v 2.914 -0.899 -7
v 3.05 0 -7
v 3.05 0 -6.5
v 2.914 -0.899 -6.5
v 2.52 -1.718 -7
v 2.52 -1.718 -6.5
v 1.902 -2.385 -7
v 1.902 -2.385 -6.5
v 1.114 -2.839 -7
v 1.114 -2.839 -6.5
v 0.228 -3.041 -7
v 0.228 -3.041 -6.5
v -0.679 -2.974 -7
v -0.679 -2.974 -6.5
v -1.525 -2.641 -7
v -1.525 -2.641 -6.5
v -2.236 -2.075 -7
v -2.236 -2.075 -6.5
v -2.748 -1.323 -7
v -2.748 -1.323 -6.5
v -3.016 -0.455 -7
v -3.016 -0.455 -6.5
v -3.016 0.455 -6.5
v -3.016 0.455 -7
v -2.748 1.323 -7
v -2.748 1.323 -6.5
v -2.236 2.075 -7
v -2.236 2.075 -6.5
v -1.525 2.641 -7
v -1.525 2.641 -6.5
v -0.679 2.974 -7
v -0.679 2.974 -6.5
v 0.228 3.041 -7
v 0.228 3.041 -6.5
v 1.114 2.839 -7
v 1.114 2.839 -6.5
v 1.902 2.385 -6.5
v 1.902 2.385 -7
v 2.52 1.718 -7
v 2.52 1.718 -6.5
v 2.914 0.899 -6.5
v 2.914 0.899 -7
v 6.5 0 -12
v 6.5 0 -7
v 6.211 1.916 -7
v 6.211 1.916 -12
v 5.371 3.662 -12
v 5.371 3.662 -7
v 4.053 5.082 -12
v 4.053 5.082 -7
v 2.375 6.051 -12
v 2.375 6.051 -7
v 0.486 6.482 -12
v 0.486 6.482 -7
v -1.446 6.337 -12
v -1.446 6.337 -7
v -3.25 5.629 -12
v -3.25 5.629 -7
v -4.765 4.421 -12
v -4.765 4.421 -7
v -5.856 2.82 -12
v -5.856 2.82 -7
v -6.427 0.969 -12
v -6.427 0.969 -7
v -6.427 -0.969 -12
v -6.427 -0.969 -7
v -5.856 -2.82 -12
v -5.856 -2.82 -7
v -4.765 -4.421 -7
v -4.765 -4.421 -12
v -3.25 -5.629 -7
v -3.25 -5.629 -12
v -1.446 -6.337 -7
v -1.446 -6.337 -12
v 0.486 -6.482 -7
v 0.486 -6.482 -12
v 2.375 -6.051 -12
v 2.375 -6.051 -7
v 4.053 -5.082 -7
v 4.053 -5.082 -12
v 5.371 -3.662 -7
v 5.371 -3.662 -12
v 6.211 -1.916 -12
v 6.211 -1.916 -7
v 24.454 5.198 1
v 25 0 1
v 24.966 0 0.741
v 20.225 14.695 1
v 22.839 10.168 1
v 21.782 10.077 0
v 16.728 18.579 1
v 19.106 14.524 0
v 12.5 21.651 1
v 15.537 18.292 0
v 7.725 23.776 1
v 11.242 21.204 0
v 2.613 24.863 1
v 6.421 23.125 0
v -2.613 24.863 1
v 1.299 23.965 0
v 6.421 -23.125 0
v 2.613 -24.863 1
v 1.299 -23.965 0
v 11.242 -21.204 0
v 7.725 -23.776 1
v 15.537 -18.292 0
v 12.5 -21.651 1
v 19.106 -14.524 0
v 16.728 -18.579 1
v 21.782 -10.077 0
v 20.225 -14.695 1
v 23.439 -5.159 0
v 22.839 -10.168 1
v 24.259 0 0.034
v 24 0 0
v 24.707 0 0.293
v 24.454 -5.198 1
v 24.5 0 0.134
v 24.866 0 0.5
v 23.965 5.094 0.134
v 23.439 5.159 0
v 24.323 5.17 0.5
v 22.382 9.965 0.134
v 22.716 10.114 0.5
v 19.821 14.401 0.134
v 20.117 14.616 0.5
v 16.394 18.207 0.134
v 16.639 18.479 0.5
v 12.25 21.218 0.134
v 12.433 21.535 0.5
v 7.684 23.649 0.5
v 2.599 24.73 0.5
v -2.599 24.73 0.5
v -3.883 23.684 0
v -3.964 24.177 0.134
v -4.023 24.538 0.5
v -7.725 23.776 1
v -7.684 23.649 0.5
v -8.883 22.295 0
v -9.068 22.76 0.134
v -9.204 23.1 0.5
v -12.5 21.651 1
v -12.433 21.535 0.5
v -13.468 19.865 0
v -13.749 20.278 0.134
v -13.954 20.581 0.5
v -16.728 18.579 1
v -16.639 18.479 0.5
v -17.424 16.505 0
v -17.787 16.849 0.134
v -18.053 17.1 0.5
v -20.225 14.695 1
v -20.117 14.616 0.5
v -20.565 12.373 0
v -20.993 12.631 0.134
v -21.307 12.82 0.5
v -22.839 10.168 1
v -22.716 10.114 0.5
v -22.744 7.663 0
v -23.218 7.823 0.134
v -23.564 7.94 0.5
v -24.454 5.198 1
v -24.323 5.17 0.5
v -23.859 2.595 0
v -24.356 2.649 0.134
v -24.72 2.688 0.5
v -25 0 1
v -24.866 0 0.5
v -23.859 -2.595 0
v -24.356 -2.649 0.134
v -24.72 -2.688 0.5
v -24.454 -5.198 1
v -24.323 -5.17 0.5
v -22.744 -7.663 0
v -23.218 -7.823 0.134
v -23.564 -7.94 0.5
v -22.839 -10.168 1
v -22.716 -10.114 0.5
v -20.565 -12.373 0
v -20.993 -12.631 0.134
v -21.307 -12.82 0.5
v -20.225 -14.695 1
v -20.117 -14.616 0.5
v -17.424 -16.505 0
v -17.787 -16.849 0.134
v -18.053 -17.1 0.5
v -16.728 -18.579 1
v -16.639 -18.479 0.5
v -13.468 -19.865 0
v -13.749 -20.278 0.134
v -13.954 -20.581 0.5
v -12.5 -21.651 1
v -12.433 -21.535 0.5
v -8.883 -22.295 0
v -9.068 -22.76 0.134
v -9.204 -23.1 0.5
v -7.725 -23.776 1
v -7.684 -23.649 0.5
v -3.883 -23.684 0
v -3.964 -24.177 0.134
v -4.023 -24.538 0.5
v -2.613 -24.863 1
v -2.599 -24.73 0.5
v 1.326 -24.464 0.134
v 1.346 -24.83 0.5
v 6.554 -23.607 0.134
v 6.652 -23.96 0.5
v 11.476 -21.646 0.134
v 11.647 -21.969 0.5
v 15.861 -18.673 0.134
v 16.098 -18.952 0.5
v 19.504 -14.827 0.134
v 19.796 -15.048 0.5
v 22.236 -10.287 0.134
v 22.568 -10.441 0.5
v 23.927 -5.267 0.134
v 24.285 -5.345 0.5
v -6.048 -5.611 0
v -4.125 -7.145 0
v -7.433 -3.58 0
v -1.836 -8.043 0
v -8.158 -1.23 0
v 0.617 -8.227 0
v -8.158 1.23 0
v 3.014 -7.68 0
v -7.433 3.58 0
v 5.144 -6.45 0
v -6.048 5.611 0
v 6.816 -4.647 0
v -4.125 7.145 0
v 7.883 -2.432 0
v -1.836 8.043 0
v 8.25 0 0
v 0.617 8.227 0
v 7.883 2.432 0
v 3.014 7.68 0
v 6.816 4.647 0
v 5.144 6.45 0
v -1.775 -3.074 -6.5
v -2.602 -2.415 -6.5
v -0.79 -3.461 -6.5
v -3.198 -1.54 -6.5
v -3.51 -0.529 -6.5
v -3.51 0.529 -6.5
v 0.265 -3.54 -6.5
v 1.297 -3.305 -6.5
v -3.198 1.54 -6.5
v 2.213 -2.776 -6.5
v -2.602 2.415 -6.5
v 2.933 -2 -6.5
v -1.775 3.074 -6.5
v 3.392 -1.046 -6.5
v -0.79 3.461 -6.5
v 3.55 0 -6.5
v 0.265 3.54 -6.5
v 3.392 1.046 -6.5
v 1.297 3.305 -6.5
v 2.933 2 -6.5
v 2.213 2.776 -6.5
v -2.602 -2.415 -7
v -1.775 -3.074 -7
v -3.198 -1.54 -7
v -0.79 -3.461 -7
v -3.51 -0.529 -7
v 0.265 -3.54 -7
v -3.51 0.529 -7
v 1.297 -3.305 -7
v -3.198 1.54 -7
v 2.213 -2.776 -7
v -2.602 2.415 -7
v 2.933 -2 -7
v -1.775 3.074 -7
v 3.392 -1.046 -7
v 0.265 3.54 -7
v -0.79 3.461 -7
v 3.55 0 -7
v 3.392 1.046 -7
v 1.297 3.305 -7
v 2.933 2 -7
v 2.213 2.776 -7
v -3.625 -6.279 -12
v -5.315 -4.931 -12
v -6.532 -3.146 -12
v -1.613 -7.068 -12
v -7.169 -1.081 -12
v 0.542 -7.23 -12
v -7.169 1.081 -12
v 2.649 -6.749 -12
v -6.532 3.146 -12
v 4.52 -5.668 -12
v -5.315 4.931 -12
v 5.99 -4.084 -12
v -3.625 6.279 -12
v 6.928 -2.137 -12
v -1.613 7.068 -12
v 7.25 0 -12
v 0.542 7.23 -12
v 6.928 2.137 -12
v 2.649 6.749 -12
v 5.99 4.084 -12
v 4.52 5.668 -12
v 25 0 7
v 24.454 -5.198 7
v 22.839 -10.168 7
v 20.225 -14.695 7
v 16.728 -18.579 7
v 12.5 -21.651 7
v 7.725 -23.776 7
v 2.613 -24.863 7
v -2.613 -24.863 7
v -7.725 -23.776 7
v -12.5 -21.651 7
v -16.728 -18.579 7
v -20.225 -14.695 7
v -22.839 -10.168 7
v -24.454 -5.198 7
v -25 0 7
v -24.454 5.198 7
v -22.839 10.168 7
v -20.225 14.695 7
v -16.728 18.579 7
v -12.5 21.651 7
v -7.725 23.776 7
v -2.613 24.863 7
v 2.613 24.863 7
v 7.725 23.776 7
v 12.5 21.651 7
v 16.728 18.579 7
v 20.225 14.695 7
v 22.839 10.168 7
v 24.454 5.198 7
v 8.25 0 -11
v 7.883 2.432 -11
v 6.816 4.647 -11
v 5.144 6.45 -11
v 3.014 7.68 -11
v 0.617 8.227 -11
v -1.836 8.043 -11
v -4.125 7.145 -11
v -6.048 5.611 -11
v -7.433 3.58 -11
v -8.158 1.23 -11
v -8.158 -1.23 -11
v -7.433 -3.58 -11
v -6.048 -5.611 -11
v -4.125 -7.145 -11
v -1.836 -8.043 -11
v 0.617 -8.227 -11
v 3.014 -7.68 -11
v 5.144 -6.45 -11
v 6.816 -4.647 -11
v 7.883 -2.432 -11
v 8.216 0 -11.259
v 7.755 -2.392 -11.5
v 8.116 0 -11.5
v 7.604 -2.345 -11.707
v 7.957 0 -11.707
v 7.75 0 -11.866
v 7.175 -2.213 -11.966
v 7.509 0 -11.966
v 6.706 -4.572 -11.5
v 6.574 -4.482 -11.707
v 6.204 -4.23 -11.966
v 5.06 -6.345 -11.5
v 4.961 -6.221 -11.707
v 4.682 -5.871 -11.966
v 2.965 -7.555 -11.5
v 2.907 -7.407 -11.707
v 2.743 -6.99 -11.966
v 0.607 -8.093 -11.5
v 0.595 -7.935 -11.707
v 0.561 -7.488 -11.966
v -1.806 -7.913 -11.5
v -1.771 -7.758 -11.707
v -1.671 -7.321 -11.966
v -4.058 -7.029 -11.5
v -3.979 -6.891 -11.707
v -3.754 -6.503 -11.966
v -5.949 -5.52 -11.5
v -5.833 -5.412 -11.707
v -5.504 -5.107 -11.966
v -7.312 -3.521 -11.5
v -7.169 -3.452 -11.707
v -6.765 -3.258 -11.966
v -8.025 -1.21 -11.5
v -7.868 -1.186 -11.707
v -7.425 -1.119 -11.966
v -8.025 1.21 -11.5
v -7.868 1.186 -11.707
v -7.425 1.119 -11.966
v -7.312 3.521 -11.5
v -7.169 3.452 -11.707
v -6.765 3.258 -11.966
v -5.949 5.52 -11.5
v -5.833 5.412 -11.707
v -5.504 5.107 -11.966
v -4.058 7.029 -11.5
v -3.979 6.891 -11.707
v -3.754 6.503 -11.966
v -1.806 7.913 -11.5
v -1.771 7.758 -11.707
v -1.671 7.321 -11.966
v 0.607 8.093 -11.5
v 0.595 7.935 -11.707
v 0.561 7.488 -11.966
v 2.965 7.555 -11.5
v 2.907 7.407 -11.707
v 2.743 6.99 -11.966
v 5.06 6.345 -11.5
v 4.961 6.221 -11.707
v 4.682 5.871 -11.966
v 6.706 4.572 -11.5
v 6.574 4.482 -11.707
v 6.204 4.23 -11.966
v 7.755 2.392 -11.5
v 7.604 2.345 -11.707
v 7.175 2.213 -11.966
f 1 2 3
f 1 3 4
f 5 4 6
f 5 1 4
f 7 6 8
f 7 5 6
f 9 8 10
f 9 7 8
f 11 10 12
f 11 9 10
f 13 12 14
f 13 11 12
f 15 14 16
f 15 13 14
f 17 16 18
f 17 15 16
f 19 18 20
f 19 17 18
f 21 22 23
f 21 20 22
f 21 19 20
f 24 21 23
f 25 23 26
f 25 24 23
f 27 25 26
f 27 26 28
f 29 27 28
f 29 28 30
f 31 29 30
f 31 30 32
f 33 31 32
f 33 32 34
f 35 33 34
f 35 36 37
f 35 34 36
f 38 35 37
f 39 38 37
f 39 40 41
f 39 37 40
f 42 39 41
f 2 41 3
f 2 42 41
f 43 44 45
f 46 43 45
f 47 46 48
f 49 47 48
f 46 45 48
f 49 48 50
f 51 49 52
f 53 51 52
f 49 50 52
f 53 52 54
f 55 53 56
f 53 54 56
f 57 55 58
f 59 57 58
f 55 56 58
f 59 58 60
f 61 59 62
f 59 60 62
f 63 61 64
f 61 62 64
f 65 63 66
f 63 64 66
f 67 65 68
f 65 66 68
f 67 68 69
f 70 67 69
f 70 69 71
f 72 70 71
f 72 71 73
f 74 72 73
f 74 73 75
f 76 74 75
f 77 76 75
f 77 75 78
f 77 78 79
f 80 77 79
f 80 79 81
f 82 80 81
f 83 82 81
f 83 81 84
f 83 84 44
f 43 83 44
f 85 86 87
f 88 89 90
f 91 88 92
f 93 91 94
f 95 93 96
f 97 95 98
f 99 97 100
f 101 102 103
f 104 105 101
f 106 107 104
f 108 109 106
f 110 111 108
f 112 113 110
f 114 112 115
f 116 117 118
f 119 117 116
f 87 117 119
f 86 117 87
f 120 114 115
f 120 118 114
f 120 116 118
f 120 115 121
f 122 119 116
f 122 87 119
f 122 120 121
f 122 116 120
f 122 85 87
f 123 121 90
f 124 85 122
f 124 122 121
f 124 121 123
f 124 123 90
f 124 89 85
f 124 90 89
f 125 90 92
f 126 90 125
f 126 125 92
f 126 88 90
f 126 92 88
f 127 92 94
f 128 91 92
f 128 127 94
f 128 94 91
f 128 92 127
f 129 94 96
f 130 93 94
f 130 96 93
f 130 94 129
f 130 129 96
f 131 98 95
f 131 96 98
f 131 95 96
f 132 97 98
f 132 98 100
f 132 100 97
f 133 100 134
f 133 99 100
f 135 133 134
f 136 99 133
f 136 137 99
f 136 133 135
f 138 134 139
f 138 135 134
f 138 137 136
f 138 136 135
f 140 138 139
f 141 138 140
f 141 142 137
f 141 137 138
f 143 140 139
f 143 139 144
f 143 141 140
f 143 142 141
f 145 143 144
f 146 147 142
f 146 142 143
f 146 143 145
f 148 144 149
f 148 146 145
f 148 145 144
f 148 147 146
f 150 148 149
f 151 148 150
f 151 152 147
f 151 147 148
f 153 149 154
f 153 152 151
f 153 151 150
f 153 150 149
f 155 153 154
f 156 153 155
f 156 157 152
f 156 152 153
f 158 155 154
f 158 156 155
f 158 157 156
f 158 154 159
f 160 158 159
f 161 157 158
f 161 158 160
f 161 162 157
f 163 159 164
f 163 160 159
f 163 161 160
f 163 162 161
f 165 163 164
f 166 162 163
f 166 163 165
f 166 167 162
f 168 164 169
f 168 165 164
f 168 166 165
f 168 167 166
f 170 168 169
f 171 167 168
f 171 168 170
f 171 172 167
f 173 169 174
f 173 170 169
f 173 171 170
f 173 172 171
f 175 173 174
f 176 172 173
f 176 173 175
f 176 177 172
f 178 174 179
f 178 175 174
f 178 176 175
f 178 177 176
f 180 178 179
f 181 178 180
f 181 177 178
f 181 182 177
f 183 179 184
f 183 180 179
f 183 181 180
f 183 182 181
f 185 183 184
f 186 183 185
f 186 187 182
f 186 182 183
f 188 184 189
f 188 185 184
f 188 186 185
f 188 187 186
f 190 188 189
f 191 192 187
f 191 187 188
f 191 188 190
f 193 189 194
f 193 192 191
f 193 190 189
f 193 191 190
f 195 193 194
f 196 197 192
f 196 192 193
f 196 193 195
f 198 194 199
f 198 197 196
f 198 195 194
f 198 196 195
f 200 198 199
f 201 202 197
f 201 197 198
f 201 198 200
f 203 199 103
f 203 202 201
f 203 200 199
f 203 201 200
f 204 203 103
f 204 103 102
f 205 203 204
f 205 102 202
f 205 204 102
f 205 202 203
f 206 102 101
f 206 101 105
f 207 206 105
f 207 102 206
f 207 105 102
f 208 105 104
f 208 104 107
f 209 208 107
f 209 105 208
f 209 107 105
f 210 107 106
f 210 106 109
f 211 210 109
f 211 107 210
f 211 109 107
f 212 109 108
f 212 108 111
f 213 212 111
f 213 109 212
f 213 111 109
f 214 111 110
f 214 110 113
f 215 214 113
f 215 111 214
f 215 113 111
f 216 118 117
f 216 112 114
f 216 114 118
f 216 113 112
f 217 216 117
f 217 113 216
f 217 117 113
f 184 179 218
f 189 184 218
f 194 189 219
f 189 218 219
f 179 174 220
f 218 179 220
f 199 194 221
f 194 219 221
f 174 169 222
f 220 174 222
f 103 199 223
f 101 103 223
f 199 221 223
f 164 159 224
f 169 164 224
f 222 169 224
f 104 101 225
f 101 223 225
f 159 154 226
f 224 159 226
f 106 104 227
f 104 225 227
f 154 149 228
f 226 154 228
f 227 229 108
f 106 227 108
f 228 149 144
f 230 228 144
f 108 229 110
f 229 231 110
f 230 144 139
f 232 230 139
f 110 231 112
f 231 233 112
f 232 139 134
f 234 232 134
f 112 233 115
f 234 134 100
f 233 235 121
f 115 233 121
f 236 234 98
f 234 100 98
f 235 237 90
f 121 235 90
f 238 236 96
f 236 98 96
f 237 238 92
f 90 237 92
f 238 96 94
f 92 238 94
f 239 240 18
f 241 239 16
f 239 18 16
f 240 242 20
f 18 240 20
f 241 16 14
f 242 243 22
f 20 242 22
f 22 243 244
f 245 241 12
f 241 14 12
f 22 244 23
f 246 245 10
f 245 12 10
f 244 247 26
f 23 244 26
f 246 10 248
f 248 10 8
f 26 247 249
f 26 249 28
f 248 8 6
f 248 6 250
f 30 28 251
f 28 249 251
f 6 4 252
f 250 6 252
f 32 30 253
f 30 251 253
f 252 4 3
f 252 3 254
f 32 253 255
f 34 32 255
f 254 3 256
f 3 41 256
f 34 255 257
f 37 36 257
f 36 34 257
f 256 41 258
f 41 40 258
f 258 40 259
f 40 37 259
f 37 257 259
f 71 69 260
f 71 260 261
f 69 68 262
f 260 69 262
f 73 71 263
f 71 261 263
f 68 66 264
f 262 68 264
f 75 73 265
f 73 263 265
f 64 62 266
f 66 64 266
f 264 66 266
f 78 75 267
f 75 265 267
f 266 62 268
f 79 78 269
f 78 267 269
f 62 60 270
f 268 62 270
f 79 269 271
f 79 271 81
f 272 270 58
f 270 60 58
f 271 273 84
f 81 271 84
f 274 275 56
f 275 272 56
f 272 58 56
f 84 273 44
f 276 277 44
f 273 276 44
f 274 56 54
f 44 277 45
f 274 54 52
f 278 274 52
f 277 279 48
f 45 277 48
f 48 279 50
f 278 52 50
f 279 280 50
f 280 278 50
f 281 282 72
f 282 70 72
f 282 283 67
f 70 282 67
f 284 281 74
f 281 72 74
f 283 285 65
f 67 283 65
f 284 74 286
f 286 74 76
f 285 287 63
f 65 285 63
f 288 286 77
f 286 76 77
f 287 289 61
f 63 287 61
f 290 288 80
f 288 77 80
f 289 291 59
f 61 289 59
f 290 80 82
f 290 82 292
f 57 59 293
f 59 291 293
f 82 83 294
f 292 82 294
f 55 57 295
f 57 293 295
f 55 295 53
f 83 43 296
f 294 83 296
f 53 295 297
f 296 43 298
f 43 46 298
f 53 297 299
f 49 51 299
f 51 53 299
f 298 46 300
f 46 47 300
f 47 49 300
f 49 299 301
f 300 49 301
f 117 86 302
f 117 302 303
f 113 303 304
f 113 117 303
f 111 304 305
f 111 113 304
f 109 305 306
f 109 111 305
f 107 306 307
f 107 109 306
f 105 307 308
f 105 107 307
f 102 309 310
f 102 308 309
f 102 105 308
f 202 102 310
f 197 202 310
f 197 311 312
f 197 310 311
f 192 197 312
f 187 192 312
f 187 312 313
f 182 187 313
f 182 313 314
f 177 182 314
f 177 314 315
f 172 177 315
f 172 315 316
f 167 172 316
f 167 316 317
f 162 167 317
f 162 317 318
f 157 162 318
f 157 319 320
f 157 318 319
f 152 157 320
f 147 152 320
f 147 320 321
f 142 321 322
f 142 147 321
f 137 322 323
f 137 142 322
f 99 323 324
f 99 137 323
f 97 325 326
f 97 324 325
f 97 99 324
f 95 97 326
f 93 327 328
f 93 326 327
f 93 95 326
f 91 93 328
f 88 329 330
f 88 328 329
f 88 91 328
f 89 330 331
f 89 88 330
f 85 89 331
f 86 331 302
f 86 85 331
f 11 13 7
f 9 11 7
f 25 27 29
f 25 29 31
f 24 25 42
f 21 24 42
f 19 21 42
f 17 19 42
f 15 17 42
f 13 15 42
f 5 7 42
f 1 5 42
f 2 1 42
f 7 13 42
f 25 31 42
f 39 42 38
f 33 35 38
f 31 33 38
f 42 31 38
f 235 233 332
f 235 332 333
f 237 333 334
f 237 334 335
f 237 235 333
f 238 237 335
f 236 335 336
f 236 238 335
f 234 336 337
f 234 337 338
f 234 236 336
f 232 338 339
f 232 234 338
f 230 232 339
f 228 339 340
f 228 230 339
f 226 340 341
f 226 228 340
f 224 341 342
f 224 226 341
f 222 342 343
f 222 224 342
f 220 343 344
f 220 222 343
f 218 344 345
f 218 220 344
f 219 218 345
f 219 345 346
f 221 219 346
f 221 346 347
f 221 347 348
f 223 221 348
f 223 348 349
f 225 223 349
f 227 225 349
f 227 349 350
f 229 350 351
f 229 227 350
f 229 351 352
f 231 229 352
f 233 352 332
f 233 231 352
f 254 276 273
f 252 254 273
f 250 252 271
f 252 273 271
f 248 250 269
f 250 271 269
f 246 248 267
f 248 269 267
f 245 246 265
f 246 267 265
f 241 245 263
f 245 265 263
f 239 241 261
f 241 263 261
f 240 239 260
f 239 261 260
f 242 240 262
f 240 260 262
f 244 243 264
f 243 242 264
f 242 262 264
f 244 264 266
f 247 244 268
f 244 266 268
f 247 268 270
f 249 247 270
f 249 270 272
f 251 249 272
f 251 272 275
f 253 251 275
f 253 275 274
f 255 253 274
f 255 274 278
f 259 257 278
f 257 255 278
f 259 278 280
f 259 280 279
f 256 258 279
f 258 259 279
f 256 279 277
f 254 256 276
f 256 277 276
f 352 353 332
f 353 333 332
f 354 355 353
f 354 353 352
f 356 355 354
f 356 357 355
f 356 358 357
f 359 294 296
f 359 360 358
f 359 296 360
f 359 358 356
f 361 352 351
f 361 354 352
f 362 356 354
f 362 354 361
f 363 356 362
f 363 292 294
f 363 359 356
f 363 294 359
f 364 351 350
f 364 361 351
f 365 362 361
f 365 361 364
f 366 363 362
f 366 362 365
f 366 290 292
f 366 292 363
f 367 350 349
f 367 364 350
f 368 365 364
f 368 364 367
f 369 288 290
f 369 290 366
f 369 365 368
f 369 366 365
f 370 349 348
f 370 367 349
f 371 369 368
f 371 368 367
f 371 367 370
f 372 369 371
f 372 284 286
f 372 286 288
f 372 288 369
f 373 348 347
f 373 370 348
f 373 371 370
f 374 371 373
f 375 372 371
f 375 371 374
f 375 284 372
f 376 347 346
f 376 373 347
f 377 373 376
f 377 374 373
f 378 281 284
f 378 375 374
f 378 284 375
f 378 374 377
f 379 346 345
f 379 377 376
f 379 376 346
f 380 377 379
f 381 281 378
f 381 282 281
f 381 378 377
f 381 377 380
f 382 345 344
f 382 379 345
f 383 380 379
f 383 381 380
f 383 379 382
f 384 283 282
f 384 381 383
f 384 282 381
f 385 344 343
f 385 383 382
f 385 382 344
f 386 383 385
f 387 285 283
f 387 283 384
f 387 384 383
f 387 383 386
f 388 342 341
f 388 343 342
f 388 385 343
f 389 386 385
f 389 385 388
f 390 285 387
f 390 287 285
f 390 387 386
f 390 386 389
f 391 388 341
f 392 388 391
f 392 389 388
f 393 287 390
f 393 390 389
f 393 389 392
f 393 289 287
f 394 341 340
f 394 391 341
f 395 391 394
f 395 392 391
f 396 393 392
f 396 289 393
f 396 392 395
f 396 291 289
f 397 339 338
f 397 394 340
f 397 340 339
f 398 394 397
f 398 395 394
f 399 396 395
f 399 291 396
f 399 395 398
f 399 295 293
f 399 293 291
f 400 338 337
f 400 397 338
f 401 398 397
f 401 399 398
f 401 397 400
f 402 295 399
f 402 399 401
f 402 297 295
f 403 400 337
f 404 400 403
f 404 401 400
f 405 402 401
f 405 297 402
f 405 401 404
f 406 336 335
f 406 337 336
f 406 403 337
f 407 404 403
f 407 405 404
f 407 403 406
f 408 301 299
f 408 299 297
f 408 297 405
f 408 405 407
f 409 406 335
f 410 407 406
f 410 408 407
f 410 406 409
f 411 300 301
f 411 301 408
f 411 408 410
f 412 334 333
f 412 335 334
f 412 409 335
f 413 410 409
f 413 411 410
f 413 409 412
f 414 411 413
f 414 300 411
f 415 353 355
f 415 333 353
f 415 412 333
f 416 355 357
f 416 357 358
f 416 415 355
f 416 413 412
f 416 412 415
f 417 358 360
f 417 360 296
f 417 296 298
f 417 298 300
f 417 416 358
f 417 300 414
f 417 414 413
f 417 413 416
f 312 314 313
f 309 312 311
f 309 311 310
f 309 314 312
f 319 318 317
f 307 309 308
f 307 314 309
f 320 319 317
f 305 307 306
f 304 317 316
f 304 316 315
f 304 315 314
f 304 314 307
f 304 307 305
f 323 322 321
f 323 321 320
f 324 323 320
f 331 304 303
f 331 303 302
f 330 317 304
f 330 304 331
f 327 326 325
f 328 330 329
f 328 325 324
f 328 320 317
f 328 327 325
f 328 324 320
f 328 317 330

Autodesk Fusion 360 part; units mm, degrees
sketch "Sketch1" plane through (0, 0, 0) normal (0, 0, 1) x (1, 0, 0)
  circle A0 centre (0, 0) radius 8.25
  circle A1 centre (0, 0) radius 6.5
  circle A2 centre (0, 0) radius 3.05
  circle A3 centre (0, 0) radius 3.55
  circle A4 centre (0, 0) radius 25
  dimension "d1" = 16.5
  dimension "d2" = 13
  dimension "d7" = 6.1
  dimension "d8" = 7.1
  dimension "d9" = 50
extrude "Extrude1" add sketch "Sketch1" against normal blind 12 contours A0
extrude "Extrude2" add sketch "Sketch1" against normal blind 7 contours A1 | A2 | A3
extrude "Extrude3" add sketch "Sketch1" against normal blind 8 contours A3
extrude "Extrude4" cut 1 faces at (3.3701, -0.1764, -8) along direction (0, 0, 1) blind 1.5
extrude "Extrude5" add sketch "Sketch1" along normal blind 7 contours A0 | A1 | A2 | A3 | A4
fillet "Fillet1" radius 1 2 edges at (-7.6917, 2.9833, -12) (-23.3082, -9.0404, 0)
